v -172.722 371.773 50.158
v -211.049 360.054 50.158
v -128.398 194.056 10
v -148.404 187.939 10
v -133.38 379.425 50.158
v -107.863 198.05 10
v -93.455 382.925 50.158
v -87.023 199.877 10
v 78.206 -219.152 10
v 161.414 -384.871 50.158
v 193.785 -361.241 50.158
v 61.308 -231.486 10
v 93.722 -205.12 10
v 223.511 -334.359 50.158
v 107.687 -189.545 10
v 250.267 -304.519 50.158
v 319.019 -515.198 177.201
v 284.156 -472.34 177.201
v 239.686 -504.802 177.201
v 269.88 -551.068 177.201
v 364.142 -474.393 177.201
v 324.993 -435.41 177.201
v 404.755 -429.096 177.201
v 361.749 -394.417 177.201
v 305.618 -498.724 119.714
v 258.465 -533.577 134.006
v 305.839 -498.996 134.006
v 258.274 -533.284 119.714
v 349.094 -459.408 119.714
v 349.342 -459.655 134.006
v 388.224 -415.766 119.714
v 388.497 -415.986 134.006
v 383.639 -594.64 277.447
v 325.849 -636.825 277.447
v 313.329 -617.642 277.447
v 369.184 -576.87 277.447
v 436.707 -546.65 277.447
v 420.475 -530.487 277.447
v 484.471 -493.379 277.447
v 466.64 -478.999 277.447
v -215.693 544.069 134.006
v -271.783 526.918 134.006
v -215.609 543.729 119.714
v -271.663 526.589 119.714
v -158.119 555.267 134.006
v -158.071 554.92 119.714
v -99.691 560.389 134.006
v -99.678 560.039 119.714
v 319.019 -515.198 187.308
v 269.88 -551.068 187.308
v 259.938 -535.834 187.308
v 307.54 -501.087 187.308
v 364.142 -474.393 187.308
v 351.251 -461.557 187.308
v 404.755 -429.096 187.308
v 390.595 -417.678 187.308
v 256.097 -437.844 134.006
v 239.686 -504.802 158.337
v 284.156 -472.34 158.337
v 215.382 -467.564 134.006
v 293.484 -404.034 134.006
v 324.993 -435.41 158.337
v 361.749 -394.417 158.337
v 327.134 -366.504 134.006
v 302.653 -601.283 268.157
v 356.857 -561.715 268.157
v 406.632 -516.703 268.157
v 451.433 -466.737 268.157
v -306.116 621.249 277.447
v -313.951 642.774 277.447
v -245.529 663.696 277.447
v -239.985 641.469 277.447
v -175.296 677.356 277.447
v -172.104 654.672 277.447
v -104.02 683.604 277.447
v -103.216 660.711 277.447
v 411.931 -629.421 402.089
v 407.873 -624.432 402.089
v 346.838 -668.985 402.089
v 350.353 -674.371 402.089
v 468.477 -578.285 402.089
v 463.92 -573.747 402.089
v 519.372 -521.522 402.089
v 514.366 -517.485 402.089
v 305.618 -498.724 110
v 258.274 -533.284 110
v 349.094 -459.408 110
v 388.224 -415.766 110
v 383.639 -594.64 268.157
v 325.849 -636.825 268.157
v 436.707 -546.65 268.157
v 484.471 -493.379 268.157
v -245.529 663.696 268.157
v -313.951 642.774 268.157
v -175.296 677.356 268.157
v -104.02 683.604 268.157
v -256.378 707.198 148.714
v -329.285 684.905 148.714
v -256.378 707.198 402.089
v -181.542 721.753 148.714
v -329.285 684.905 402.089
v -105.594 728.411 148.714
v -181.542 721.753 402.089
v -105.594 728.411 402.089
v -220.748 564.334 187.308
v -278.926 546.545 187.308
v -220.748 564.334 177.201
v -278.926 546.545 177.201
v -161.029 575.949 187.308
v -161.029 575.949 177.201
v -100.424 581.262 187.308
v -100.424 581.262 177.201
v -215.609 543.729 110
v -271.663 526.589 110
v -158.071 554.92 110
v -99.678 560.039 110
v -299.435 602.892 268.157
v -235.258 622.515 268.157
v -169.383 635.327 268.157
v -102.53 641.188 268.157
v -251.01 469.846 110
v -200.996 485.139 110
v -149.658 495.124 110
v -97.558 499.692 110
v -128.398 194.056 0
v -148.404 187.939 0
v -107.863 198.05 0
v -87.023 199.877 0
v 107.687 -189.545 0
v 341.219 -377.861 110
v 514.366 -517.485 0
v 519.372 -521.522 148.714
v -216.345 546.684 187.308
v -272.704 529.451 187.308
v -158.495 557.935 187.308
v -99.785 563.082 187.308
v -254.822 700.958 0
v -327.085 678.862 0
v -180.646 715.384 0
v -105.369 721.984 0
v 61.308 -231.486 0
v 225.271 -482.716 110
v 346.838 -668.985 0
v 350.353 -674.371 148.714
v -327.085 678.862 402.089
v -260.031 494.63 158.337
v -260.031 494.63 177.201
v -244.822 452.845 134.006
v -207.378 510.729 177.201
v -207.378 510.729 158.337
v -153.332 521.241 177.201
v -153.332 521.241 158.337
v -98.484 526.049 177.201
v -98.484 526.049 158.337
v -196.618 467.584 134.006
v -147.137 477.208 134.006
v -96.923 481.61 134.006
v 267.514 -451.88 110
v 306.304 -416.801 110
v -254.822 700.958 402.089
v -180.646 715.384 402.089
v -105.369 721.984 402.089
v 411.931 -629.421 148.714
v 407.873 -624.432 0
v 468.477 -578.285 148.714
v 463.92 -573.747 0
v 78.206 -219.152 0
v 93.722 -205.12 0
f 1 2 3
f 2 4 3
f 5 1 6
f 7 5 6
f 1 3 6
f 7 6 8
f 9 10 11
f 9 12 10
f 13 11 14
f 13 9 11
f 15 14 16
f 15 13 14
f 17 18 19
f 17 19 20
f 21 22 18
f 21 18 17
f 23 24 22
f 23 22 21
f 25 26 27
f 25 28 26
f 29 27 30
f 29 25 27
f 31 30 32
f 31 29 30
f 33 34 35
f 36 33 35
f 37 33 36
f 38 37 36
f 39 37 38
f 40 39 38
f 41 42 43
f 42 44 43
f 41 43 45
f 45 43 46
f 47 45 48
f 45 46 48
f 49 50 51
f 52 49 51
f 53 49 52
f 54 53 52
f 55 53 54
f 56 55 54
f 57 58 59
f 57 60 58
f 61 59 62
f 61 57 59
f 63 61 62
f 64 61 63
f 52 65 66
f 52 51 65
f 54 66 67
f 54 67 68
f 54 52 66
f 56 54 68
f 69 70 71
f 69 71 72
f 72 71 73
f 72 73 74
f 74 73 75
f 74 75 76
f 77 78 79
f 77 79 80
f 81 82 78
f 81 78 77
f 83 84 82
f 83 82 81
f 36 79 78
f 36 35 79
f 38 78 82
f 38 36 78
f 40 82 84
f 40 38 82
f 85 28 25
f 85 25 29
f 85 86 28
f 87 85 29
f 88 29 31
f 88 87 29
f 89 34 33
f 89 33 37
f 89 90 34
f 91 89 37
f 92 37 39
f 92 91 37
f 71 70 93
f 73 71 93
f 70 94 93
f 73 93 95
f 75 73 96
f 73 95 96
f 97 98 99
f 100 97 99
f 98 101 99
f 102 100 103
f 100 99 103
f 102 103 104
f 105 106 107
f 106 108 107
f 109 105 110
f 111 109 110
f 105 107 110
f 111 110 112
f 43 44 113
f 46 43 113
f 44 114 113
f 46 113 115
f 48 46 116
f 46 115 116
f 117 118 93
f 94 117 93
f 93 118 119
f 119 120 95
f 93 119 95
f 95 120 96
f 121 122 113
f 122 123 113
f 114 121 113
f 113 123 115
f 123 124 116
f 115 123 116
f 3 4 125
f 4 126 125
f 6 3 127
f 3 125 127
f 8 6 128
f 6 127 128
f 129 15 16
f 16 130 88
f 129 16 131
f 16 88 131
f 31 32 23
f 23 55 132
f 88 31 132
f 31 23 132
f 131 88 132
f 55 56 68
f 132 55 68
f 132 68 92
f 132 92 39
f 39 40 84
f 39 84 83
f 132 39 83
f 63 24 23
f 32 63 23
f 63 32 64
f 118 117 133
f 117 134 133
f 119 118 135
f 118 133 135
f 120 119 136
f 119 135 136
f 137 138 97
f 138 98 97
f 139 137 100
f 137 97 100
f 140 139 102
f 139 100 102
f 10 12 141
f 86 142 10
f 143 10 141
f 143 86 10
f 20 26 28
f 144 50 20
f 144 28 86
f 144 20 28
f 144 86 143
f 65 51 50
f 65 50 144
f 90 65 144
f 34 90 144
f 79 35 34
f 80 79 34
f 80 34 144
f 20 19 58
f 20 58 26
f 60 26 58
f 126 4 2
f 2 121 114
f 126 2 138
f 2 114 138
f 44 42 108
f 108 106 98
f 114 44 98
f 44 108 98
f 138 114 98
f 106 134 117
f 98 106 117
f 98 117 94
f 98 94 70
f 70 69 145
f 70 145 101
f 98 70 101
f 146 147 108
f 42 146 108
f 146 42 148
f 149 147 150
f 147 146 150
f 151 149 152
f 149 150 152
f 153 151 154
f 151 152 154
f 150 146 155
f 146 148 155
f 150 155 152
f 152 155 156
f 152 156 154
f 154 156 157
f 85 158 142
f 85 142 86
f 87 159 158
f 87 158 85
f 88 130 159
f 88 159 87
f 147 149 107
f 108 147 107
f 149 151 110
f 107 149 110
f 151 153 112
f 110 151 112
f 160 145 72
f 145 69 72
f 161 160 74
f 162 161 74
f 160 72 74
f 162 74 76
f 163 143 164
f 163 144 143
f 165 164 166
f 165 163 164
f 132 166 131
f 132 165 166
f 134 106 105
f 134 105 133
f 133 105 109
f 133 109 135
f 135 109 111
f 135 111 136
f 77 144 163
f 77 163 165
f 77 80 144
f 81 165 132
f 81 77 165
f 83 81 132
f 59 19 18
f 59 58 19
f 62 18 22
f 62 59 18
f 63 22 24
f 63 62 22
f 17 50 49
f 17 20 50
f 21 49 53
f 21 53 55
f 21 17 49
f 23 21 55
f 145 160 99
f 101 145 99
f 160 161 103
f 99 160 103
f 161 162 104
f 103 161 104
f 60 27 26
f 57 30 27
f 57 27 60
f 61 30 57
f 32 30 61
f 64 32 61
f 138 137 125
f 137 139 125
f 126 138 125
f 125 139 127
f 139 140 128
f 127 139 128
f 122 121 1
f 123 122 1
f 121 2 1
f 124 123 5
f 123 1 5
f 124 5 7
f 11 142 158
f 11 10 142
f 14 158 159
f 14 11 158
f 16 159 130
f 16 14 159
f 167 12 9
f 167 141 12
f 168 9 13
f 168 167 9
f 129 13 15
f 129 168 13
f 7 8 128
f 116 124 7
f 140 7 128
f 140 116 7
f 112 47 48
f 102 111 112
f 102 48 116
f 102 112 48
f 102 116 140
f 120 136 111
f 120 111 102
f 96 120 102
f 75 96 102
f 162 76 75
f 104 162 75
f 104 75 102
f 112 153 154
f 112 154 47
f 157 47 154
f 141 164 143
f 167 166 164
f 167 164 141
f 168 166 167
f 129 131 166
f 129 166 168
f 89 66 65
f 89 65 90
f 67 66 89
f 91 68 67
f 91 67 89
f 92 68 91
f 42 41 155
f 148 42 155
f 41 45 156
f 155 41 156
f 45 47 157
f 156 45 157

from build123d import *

# Parameters (mm, degrees)
F3_ANGLE_START = 250
F3_ANGLE       = 17.9876048978


with BuildPart() as f3:
    # F0 (on Front) → F3 (revolve)
    with BuildSketch(Plane.XZ, mode=Mode.PRIVATE) as f3_sk:
        Polygon((120, 10), (120, 0), (355.2403748035, 0), (642.4294114113, 0), (648.8609313965, 148.714363575), (648.8609313965, 402.0894765854), (642.4294114113, 402.0894765854), (581.1189413071, 277.4473130703), (604.0261387825, 277.4473130703), (604.0261387825, 268.1565284729), (575.0552415848, 268.1565284729), (561.5838170052, 268.1565284729), (483.4298193455, 187.307536602), (501.6208291054, 187.307536602), (501.6208291054, 177.2014200687), (446.3740289211, 177.2014200687), (446.3740289211, 158.3366543055), (401.9070863724, 134.0060383081), (420, 134.0060383081), (480.7348549366, 134.0060383081), (480.3846478462, 119.7138205171), (480.3846478462, 110), (420, 110), (303.1612038612, 50.1583777368), align=None)
    revolve(f3_sk.sketch.rotate(Axis((-80, 0, 35.9871760011), (0, 0, -1)), F3_ANGLE_START), axis=Axis((-80, 0, 35.9871760011), (0, 0, -1)), revolution_arc=F3_ANGLE)


with BuildPart() as f5_1:
    # F5: instance of F3
    add(f3.part.mirror(Plane(origin=(0, 0, 0), x_dir=(0.894427191, 0.4472135955, 0), z_dir=(0.4472135955, -0.894427191, 0))))


solid = Compound([f3.part, f5_1.part])
